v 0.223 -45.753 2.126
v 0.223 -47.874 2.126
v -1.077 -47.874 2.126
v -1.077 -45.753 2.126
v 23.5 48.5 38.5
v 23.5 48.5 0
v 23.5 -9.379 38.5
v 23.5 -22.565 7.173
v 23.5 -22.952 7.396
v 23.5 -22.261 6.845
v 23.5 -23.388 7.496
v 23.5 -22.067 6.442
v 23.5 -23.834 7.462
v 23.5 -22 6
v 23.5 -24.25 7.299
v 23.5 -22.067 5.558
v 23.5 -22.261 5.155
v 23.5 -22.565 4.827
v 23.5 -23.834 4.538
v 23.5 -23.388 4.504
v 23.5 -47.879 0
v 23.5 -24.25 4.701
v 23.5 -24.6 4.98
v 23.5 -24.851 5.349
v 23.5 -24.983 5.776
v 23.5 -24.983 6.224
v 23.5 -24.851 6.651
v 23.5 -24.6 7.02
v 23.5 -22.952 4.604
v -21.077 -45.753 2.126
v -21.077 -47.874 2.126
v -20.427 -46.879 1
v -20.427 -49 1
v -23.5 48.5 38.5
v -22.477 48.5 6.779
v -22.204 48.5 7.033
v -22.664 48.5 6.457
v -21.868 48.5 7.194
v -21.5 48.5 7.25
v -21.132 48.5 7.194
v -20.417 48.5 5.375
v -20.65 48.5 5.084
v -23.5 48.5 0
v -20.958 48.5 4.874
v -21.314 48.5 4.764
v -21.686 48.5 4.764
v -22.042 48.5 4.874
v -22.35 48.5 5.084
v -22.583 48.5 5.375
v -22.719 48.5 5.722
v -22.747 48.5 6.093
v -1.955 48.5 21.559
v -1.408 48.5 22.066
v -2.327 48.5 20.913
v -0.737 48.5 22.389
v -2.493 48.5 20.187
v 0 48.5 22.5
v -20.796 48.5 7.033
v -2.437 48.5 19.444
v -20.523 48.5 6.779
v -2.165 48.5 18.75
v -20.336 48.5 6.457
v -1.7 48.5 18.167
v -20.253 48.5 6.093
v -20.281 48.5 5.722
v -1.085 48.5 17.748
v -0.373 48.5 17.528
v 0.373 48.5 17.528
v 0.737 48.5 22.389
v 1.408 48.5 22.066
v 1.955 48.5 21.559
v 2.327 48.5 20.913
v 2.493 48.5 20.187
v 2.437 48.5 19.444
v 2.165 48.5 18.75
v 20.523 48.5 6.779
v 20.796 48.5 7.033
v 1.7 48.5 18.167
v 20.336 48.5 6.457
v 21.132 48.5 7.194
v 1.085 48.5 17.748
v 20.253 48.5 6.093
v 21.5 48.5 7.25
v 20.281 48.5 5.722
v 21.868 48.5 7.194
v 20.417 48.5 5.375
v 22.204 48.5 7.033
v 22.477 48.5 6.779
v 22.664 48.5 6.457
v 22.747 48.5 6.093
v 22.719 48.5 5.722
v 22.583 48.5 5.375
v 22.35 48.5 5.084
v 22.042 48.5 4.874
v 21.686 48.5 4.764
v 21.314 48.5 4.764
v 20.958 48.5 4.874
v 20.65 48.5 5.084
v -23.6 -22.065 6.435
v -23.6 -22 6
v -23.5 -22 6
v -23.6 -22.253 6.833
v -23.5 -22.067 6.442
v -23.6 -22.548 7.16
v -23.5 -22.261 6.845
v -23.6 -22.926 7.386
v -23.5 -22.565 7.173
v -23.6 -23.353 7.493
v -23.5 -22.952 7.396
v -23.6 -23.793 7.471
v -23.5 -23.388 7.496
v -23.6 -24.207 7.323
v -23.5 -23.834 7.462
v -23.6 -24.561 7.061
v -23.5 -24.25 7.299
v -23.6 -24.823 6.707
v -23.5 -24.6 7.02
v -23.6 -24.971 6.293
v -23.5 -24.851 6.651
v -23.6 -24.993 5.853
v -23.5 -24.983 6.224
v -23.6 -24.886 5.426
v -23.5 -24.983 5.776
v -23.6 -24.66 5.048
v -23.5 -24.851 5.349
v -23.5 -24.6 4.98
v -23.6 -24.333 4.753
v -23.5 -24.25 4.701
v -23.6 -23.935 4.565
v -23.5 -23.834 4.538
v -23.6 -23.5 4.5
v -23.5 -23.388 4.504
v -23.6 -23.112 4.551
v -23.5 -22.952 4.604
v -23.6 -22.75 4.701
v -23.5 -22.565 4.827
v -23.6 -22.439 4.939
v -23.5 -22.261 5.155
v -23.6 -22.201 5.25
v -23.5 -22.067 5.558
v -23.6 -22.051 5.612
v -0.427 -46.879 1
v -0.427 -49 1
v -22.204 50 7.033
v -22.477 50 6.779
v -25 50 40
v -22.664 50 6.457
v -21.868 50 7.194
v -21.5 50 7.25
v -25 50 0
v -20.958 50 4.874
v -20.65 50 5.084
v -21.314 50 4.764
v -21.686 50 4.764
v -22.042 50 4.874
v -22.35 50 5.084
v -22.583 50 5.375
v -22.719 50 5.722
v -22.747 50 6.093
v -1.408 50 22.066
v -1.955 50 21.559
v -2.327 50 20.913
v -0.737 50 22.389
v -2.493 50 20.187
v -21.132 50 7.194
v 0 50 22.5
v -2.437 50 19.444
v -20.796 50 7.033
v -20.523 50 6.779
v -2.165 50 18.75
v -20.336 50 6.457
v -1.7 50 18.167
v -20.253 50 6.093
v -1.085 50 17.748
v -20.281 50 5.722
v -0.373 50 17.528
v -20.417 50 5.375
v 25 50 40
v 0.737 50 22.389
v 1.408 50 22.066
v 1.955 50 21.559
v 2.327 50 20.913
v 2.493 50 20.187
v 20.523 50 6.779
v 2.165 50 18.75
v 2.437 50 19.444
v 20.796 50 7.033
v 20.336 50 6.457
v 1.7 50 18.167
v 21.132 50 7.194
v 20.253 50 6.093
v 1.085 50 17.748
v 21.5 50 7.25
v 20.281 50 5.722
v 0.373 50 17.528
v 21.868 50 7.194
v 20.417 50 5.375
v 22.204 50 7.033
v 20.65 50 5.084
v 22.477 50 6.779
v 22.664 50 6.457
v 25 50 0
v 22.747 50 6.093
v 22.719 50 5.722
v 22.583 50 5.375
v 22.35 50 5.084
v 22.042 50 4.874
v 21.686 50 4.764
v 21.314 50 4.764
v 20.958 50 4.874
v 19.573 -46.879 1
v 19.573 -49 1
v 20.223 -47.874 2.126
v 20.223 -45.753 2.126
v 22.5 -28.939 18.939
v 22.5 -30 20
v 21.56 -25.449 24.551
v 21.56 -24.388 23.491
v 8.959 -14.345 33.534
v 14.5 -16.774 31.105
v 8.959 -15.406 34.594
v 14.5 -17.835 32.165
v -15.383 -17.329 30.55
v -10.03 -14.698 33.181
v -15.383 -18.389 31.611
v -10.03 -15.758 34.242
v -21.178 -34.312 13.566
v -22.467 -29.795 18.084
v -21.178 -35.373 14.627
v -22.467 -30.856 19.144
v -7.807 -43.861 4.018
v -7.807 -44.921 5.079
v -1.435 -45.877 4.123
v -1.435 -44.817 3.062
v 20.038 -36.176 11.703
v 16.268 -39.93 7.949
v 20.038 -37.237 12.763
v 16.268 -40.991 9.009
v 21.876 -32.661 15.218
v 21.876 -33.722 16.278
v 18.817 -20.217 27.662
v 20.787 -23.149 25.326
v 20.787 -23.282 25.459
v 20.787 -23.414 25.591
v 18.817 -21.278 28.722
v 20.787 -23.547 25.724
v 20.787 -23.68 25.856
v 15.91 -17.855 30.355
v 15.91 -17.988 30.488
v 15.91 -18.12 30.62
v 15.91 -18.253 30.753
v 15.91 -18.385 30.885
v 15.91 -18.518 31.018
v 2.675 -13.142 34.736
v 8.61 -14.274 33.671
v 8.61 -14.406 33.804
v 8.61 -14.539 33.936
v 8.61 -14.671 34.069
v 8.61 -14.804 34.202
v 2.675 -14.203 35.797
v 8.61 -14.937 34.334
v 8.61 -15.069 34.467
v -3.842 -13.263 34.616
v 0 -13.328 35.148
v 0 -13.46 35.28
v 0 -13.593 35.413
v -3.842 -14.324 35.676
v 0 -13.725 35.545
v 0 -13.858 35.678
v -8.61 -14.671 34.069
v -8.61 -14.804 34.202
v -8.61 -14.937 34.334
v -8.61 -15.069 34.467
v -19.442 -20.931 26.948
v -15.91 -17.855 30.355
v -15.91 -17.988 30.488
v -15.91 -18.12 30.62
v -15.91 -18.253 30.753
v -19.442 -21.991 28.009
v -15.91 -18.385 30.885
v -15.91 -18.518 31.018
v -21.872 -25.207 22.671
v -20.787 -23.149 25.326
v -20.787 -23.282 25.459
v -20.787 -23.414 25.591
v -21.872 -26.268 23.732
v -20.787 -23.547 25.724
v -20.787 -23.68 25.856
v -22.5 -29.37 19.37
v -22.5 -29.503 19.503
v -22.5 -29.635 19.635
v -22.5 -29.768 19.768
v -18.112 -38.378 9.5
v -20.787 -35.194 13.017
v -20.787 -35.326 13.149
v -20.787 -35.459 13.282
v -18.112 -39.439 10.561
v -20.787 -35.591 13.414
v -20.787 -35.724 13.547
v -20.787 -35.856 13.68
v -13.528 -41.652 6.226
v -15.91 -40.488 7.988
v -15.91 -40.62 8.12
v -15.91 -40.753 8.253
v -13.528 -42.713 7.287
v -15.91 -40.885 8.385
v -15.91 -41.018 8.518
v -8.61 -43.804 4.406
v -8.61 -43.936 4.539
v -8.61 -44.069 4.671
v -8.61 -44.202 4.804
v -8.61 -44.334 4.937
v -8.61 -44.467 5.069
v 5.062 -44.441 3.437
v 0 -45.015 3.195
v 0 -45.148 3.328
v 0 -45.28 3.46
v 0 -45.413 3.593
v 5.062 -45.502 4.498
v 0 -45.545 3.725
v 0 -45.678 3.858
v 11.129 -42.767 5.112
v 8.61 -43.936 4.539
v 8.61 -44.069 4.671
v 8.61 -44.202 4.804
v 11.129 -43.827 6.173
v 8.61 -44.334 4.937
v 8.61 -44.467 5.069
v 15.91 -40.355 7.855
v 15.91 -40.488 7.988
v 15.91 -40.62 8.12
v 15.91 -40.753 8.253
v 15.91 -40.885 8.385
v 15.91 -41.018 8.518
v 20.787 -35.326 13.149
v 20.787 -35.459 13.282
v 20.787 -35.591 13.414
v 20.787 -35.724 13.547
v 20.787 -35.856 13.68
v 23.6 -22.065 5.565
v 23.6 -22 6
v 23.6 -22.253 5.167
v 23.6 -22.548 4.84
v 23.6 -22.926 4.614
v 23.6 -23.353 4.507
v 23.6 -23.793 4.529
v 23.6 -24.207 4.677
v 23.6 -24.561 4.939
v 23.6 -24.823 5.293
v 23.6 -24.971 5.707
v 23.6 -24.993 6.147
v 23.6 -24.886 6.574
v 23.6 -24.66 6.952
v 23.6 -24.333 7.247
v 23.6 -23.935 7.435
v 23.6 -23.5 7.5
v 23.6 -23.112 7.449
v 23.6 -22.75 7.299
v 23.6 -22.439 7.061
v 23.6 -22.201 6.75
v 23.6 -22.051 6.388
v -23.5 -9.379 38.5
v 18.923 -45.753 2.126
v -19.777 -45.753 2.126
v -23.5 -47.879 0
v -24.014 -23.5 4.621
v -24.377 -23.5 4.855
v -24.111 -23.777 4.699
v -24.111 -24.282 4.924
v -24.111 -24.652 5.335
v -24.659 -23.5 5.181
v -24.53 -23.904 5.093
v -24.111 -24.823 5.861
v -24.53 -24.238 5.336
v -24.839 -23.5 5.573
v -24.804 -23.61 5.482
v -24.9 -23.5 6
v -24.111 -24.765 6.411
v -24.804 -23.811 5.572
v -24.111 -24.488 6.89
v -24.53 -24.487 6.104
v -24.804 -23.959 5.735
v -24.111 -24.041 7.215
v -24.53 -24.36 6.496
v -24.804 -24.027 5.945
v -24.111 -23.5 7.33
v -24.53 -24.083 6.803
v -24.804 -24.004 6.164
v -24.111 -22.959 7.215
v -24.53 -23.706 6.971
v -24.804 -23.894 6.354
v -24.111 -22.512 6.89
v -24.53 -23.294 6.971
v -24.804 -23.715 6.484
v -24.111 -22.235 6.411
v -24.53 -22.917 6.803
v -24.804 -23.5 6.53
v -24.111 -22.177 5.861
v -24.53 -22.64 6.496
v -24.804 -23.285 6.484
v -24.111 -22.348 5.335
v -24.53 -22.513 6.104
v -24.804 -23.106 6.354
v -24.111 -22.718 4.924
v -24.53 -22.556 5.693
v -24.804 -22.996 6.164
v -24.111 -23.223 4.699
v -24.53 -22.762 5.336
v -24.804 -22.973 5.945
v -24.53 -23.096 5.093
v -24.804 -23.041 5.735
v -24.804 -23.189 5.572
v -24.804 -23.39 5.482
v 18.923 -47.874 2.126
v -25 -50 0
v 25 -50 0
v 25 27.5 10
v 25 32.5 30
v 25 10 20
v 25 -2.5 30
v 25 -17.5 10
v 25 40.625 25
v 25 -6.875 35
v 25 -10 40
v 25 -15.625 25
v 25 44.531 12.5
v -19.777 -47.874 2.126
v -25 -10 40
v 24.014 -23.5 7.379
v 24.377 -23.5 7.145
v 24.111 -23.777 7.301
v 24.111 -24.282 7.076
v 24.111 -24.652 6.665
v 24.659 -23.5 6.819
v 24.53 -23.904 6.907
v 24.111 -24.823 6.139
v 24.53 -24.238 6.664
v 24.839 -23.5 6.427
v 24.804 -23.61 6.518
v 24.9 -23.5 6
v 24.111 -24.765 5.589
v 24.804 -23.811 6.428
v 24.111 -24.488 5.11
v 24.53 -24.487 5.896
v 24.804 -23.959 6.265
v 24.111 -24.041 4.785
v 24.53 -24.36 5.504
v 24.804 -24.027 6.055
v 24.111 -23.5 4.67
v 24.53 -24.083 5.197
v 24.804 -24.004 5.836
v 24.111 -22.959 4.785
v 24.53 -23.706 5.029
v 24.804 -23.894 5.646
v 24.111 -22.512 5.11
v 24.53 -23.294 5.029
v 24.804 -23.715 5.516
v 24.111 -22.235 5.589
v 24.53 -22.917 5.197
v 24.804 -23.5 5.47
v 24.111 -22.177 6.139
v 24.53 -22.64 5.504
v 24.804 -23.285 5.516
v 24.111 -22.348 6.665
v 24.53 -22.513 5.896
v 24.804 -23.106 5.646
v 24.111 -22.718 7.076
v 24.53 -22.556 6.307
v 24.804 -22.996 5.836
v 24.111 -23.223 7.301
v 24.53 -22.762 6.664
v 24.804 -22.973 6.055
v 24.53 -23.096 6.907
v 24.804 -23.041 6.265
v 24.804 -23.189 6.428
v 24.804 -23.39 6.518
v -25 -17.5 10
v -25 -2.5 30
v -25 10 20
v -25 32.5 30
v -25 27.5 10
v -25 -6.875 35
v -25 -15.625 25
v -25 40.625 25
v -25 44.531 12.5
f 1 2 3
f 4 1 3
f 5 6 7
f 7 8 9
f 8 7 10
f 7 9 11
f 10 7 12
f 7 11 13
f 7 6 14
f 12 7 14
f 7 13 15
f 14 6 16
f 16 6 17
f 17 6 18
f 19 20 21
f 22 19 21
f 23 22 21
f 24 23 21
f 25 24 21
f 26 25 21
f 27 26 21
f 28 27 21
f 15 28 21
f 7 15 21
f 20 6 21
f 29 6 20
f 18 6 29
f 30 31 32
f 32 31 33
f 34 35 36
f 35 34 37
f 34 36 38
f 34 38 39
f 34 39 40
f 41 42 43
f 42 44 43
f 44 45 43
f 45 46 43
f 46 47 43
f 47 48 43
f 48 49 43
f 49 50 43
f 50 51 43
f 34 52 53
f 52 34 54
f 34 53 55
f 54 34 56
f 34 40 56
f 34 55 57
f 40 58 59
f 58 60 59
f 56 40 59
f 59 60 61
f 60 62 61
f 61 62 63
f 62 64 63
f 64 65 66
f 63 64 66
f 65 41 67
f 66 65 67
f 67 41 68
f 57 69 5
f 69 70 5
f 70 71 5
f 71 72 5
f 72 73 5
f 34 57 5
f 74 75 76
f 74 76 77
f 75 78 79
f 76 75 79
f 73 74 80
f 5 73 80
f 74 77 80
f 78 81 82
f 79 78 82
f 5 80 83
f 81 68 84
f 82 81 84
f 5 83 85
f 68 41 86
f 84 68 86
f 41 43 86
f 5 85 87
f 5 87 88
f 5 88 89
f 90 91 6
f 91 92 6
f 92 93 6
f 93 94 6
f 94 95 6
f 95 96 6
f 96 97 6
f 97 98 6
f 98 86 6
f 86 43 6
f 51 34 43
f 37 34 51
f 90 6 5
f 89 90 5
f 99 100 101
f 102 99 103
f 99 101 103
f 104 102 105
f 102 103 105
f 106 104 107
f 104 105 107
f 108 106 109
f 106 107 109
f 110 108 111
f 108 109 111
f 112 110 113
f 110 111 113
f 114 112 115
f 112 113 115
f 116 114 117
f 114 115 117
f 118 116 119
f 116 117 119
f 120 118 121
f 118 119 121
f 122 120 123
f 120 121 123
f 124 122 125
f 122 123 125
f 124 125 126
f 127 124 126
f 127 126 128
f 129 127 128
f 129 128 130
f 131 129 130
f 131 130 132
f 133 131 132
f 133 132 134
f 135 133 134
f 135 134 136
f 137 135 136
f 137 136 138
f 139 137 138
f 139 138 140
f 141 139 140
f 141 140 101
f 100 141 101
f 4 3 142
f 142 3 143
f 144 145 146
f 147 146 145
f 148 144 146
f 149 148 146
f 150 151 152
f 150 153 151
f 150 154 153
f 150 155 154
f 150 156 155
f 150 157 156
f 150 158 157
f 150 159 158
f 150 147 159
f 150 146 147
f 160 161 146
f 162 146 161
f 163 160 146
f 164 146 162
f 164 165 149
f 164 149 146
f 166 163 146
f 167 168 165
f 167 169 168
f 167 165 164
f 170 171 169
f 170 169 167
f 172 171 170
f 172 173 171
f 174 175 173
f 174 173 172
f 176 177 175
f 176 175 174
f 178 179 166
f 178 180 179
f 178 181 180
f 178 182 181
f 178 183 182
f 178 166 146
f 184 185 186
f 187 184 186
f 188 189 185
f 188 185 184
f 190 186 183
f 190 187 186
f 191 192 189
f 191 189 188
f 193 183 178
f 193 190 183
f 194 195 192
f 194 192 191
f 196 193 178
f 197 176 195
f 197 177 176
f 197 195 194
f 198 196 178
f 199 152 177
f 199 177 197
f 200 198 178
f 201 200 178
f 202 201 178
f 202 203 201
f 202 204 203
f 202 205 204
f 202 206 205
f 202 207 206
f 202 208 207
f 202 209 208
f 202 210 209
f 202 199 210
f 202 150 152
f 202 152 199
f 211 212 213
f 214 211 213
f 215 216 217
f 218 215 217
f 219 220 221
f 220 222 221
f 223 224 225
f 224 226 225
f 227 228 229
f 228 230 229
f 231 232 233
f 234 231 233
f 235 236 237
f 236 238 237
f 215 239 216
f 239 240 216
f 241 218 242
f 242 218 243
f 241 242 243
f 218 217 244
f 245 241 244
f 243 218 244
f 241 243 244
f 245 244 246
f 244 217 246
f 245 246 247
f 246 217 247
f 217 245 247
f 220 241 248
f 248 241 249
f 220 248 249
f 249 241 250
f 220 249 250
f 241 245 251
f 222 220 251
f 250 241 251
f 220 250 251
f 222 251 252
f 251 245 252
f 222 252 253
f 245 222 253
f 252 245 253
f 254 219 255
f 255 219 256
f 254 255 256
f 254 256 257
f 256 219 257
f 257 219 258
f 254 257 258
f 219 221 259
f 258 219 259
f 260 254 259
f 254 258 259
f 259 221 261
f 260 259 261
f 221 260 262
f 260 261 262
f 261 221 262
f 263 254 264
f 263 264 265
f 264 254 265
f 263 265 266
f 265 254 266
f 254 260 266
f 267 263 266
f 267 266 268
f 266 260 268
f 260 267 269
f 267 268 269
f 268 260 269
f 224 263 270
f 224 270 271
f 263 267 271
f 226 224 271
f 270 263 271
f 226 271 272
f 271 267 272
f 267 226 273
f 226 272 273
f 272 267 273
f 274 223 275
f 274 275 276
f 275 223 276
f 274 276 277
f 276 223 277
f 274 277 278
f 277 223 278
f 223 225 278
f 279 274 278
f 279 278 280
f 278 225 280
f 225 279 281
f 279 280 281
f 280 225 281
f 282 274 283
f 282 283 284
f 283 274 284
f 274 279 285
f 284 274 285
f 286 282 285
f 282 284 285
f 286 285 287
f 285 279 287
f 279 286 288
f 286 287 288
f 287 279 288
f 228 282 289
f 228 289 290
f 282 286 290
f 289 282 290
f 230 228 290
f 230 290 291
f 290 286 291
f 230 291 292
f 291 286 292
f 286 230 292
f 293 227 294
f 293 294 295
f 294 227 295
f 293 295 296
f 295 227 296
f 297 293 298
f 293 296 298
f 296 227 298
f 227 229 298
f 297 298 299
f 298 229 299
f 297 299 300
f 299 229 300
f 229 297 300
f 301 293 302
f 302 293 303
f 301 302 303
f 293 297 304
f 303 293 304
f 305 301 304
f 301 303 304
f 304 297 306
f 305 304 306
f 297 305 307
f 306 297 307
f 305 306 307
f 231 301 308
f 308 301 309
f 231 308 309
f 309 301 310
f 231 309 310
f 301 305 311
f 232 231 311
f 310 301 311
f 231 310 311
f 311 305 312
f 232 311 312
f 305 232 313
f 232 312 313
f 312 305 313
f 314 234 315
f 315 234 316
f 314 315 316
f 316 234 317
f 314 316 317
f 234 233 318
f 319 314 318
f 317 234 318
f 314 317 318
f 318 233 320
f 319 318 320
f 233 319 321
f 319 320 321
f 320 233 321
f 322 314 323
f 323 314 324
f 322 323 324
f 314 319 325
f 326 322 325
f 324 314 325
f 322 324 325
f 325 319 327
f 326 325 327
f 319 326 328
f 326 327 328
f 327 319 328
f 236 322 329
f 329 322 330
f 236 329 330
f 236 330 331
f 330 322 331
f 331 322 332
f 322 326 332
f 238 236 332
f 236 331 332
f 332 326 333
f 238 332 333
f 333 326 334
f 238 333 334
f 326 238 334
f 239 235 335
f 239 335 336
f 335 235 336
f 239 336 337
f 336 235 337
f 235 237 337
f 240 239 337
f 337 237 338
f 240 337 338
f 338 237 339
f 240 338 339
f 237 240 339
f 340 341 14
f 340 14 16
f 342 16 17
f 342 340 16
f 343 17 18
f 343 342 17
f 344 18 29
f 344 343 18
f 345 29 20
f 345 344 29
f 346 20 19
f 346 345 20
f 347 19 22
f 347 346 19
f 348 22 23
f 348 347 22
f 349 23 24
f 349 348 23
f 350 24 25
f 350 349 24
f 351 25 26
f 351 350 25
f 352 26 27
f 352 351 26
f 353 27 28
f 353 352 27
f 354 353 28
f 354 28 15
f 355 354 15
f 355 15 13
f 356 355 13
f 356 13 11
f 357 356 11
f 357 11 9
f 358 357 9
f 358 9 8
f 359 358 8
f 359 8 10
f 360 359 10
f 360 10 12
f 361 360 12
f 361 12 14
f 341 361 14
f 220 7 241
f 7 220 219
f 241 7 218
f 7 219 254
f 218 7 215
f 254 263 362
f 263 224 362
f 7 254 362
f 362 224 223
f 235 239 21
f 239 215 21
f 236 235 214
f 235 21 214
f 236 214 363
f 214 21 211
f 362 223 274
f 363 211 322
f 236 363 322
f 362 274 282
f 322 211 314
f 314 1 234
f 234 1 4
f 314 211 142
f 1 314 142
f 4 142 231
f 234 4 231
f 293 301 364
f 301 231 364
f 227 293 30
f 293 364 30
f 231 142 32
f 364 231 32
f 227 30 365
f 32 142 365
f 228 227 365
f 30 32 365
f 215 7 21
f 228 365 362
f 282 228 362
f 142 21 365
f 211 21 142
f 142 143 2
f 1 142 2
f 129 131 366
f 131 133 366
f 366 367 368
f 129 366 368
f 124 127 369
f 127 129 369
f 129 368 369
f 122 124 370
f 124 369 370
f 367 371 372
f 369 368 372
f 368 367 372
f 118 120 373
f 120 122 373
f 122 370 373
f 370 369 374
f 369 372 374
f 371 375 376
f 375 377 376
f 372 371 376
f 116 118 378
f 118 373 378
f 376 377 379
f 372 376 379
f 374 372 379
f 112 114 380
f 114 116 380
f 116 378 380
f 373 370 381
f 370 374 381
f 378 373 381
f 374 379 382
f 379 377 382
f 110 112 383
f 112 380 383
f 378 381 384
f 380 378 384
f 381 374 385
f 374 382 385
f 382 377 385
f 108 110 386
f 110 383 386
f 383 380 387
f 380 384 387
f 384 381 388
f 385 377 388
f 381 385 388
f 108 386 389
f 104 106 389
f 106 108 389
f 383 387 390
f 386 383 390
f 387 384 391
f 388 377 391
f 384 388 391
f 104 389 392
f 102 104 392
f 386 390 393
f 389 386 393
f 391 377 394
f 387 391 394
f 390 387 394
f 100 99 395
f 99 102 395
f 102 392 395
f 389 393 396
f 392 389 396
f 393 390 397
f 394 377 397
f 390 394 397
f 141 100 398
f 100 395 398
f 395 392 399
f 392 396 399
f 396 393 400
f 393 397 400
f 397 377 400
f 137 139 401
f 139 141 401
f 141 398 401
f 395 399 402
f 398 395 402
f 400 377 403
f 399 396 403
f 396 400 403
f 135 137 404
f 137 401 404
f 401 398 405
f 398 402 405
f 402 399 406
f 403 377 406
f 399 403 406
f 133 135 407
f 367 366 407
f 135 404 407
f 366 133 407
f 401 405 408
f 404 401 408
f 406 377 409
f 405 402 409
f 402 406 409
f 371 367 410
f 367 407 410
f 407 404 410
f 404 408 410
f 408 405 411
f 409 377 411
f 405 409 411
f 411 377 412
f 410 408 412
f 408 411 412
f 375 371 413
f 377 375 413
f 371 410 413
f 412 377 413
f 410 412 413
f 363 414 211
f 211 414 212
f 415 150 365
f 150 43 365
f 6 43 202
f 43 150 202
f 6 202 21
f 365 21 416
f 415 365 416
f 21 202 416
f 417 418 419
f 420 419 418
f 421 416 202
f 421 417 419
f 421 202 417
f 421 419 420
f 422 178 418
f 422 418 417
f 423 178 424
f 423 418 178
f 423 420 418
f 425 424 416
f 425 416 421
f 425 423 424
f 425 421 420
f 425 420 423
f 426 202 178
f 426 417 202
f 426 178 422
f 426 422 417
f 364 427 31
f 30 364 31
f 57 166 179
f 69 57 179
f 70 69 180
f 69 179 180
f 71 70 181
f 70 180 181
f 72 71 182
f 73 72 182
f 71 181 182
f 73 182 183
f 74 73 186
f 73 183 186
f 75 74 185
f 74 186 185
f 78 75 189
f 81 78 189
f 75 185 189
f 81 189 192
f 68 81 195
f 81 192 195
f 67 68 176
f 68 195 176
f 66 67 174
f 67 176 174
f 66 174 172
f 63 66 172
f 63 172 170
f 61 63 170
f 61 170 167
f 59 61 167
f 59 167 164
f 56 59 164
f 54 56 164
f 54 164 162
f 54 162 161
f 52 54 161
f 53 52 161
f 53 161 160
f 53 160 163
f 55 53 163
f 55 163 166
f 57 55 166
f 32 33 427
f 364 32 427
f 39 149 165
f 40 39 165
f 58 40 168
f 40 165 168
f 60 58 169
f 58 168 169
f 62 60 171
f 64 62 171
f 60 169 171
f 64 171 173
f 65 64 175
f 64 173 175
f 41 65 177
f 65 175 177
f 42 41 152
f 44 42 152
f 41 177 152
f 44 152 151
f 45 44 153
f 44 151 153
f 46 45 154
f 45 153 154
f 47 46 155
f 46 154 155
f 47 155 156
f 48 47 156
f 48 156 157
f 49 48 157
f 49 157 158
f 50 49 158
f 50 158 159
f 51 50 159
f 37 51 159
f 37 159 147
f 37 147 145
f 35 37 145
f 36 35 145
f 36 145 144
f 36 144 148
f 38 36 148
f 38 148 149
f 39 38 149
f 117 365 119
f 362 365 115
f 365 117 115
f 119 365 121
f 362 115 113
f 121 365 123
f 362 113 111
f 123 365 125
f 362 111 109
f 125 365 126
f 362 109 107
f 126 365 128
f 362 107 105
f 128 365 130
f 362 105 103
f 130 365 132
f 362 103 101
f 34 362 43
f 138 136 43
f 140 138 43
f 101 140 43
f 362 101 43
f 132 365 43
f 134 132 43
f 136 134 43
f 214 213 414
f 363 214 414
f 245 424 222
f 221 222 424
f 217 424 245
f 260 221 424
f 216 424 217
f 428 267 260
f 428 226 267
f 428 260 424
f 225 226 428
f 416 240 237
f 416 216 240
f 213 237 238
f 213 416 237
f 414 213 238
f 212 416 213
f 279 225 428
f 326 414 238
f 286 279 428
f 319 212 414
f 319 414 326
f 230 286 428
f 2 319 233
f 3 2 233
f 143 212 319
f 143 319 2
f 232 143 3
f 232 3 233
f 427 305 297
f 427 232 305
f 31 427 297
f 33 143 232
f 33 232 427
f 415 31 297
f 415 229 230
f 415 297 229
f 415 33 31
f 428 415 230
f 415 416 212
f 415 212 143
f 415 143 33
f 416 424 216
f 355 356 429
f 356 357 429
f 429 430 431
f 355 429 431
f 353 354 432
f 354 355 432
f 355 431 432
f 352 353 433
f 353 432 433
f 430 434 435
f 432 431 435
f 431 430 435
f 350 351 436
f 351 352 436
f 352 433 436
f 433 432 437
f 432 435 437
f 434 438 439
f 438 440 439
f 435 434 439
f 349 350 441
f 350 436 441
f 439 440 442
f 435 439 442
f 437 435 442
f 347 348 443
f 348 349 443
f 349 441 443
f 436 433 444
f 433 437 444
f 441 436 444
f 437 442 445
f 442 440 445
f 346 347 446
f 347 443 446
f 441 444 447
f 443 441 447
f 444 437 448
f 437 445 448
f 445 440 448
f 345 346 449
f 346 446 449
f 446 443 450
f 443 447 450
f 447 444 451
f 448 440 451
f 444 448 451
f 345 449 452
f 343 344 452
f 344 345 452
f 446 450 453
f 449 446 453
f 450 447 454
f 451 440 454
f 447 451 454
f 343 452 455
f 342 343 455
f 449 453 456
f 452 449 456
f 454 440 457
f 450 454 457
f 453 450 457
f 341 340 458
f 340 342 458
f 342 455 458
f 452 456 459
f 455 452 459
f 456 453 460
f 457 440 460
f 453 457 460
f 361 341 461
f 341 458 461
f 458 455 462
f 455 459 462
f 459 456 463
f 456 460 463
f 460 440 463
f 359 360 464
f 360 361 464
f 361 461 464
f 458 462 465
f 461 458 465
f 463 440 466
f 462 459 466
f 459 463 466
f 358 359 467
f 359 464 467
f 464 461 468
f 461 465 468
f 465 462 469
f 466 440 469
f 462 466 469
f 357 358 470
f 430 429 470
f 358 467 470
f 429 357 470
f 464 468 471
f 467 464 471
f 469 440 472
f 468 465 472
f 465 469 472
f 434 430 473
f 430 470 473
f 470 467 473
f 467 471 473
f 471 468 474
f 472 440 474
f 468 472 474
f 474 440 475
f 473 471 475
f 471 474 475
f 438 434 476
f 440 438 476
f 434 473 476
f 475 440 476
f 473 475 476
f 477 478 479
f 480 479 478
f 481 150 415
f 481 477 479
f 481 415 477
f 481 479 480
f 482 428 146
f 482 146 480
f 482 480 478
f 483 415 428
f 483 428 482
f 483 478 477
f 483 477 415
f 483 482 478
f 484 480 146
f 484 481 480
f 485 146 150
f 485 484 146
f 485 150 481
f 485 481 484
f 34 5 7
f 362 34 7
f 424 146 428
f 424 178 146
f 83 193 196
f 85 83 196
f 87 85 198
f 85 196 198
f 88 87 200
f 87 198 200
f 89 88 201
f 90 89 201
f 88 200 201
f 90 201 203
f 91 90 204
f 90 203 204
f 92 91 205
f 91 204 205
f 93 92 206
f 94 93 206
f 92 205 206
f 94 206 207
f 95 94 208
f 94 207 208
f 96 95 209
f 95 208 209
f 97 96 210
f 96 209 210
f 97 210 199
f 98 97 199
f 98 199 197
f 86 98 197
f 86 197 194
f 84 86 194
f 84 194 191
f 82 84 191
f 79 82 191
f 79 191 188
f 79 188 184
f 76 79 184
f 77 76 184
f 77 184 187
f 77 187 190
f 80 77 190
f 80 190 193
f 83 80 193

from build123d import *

# Parameters (mm, degrees)
BO_ALTMA1_T           = -1.5
MENFEZ1_START         = -35.355339059
MENFEZ1_DEPTH         = 1.5
IZIM6_R               = 2.5
KES_EKSTR_ZYON2_DEPTH = 111.566722087
KES_EKSTR_ZYON3_DEPTH = 10
IZIM9_R               = 1.5
KES_EKSTR_ZYON4_DEPTH = 0.1
KUBBE2_FACE_RADIUS    = 1.5
KUBBE2_HEIGHT         = 1.3
KES_EKSTR_ZYON5_START = -0.1
IZIM10_R              = 1.5
KES_EKSTR_ZYON5_DEPTH = 0.1
KUBBE3_FACE_RADIUS    = 1.5
KUBBE3_HEIGHT         = 1.3
KES_EKSTR_ZYON6_REACH = 112.567
IZIM11_R              = 1.25


# Read off the part's stored shape, not the designer's step: Menfez1
with BuildPart() as part:
    # Çizim2 → Loft1 section 0
    with BuildSketch(Plane.XY.offset(40)):
        with BuildLine():
            Line((-25, 50), (25, 50))
            Line((25, 50), (25, -10))
            Line((25, -10), (-25, -10))
            Line((-25, -10), (-25, 50))
        make_face()
    # Çizim1 → Loft1 section 1
    with BuildSketch(Plane.XY):
        with BuildLine():
            Line((-25, 50), (25, 50))
            Line((25, 50), (25, -50))
            Line((25, -50), (-25, -50))
            Line((-25, -50), (-25, 50))
        make_face()
    loft()

    # İç Boşaltma1
    bo_altma1_openings = [part.faces().sort_by_distance(p)[0] for p in [
        (0, 0, 0),
    ]]
    offset(amount=BO_ALTMA1_T, openings=bo_altma1_openings, kind=Kind.INTERSECTION)

    # Menfez1 outline → Menfez1 (cut)
    with BuildSketch(Plane(origin=(0, 0, 0), x_dir=(1, 0, 0), z_dir=(0, 0.707106781186547, -0.7071067811865479)).offset(MENFEZ1_START)):
        with BuildLine():
            add(Edge.make_bspline(
                [(22.5, 7.071067812), (22.5, 5.598458472), (22.209921279, 2.653239791), (20.921288378, -1.594813577), (18.828662098, -5.509841982), (16.012460892, -8.94139308), (12.580909794, -11.757594286), (8.665881389, -13.850220566), (4.417828021, -15.138853467), (0, -15.573971549), (-4.417828021, -15.138853467), (-8.665881389, -13.850220566), (-12.580909794, -11.757594286), (-16.012460892, -8.94139308), (-18.828662098, -5.509841982), (-20.921288378, -1.594813577), (-22.209921279, 2.653239791), (-22.645039361, 7.071067812), (-22.209921279, 11.488895833), (-20.921288378, 15.7369492), (-18.828662098, 19.651977606), (-16.012460892, 23.083528704), (-12.580909794, 25.89972991), (-8.665881389, 27.99235619), (-4.417828021, 29.280989091), (0, 29.716107172), (4.417828021, 29.280989091), (8.665881389, 27.99235619), (12.580909794, 25.89972991), (16.012460892, 23.083528704), (18.828662098, 19.651977606), (20.921288378, 15.7369492), (22.209921279, 11.488895833), (22.5, 8.543677152), (22.5, 7.071067812)],
                knots=[0, 0, 0, 0, 0.03125, 0.0625, 0.09375, 0.125, 0.15625, 0.1875, 0.21875, 0.25, 0.28125, 0.3125, 0.34375, 0.375, 0.40625, 0.4375, 0.46875, 0.5, 0.53125, 0.5625, 0.59375, 0.625, 0.65625, 0.6875, 0.71875, 0.75, 0.78125, 0.8125, 0.84375, 0.875, 0.90625, 0.9375, 0.96875, 1, 1, 1, 1], degree=3))
        make_face()
    extrude(amount=MENFEZ1_DEPTH, mode=Mode.SUBTRACT)

    # Çizim6 → Kes-Ekstrüzyon2 (cut, through all)
    with BuildSketch(Plane(origin=(0, 50, 0), x_dir=(1, 0, 0), z_dir=(0, 1, 0))):
        with Locations(Location((0, -20, 0), (0, 0, 270))):
            Circle(IZIM6_R)
    extrude(amount=-KES_EKSTR_ZYON2_DEPTH, mode=Mode.SUBTRACT)

    # Çizim7 → Kes-Ekstrüzyon3 (cut)
    with BuildSketch(Plane(origin=(0, -50, 0), x_dir=(1, 0, 0), z_dir=(0, 1, 0))):
        Polygon((19.573356646, -1), (20.223356646, -2.125833025), (18.923356646, -2.125833025), align=None)
        Polygon((-0.426643354, -1), (0.223356646, -2.125833025), (-1.076643354, -2.125833025), align=None)
        Polygon((-20.426643354, -1), (-19.776643354, -2.125833025), (-21.076643354, -2.125833025), align=None)
    extrude(amount=KES_EKSTR_ZYON3_DEPTH, mode=Mode.SUBTRACT)

    # Çizim9 → Kes-Ekstrüzyon4 (cut)
    with BuildSketch(Plane(origin=(-23.5, 0, 0), x_dir=(0, 0, -1), z_dir=(1, 0, 0))):
        with Locations(Location((-6, -23.5, 0), (0, 0, 90))):
            Circle(IZIM9_R)
    extrude(amount=-KES_EKSTR_ZYON4_DEPTH, mode=Mode.SUBTRACT)

    # Kubbe2: a dome of height H over a round flat face of radius A is a cap of a sphere of radius (A * A + H * H) / (2 * H)
    kubbe2_r = (KUBBE2_FACE_RADIUS * KUBBE2_FACE_RADIUS + KUBBE2_HEIGHT * KUBBE2_HEIGHT) / (2 * KUBBE2_HEIGHT)
    kubbe2_base = Plane((-23.6, -23.5, 6), z_dir=(-1, 0, 0))
    with Locations(kubbe2_base.offset(KUBBE2_HEIGHT - kubbe2_r)):
        kubbe2_ball = Sphere(kubbe2_r, mode=Mode.PRIVATE)
    add(split(kubbe2_ball, bisect_by=kubbe2_base, keep=Keep.TOP, mode=Mode.PRIVATE), mode=Mode.SUBTRACT)

    # Çizim10 → Kes-Ekstrüzyon5 (cut)
    with BuildSketch(Plane.ZY.offset(-23.5).offset(KES_EKSTR_ZYON5_START)):
        with Locations(Location((6, -23.5, 0), (0, 0, 90))):
            Circle(IZIM10_R)
    extrude(amount=KES_EKSTR_ZYON5_DEPTH, mode=Mode.SUBTRACT)

    # Kubbe3: a dome of height H over a round flat face of radius A is a cap of a sphere of radius (A * A + H * H) / (2 * H)
    kubbe3_r = (KUBBE3_FACE_RADIUS * KUBBE3_FACE_RADIUS + KUBBE3_HEIGHT * KUBBE3_HEIGHT) / (2 * KUBBE3_HEIGHT)
    kubbe3_base = Plane((23.6, -23.5, 6), z_dir=(1, 0, 0))
    with Locations(kubbe3_base.offset(KUBBE3_HEIGHT - kubbe3_r)):
        kubbe3_ball = Sphere(kubbe3_r, mode=Mode.PRIVATE)
    add(split(kubbe3_ball, bisect_by=kubbe3_base, keep=Keep.TOP, mode=Mode.PRIVATE), mode=Mode.SUBTRACT)

    # Çizim11 → Kes-Ekstrüzyon6 (cut, up to next)
    with BuildSketch(Plane(origin=(0, 50, 0), x_dir=(1, 0, 0), z_dir=(0, 1, 0)), mode=Mode.PRIVATE) as kes_ekstr_zyon6_sk1:
        with Locations(Location((21.5, -6, 0), (0, 0, 270))):
            Circle(IZIM11_R)
    kes_ekstr_zyon6_tool1 = extrude(kes_ekstr_zyon6_sk1.sketch, amount=-KES_EKSTR_ZYON6_REACH, mode=Mode.PRIVATE) & part.part
    # Çizim11 → Kes-Ekstrüzyon6 (cut, up to next)
    with BuildSketch(Plane(origin=(0, 50, 0), x_dir=(1, 0, 0), z_dir=(0, 1, 0)), mode=Mode.PRIVATE) as kes_ekstr_zyon6_sk2:
        with Locations(Location((-21.5, -6, 0), (0, 0, 270))):
            Circle(IZIM11_R)
    kes_ekstr_zyon6_tool2 = extrude(kes_ekstr_zyon6_sk2.sketch, amount=-KES_EKSTR_ZYON6_REACH, mode=Mode.PRIVATE) & part.part
    add(kes_ekstr_zyon6_tool1.solids().sort_by_distance((21.5, 50, 6))[0], mode=Mode.SUBTRACT)
    add(kes_ekstr_zyon6_tool2.solids().sort_by_distance((-21.5, 50, 6))[0], mode=Mode.SUBTRACT)


solid = part.part
